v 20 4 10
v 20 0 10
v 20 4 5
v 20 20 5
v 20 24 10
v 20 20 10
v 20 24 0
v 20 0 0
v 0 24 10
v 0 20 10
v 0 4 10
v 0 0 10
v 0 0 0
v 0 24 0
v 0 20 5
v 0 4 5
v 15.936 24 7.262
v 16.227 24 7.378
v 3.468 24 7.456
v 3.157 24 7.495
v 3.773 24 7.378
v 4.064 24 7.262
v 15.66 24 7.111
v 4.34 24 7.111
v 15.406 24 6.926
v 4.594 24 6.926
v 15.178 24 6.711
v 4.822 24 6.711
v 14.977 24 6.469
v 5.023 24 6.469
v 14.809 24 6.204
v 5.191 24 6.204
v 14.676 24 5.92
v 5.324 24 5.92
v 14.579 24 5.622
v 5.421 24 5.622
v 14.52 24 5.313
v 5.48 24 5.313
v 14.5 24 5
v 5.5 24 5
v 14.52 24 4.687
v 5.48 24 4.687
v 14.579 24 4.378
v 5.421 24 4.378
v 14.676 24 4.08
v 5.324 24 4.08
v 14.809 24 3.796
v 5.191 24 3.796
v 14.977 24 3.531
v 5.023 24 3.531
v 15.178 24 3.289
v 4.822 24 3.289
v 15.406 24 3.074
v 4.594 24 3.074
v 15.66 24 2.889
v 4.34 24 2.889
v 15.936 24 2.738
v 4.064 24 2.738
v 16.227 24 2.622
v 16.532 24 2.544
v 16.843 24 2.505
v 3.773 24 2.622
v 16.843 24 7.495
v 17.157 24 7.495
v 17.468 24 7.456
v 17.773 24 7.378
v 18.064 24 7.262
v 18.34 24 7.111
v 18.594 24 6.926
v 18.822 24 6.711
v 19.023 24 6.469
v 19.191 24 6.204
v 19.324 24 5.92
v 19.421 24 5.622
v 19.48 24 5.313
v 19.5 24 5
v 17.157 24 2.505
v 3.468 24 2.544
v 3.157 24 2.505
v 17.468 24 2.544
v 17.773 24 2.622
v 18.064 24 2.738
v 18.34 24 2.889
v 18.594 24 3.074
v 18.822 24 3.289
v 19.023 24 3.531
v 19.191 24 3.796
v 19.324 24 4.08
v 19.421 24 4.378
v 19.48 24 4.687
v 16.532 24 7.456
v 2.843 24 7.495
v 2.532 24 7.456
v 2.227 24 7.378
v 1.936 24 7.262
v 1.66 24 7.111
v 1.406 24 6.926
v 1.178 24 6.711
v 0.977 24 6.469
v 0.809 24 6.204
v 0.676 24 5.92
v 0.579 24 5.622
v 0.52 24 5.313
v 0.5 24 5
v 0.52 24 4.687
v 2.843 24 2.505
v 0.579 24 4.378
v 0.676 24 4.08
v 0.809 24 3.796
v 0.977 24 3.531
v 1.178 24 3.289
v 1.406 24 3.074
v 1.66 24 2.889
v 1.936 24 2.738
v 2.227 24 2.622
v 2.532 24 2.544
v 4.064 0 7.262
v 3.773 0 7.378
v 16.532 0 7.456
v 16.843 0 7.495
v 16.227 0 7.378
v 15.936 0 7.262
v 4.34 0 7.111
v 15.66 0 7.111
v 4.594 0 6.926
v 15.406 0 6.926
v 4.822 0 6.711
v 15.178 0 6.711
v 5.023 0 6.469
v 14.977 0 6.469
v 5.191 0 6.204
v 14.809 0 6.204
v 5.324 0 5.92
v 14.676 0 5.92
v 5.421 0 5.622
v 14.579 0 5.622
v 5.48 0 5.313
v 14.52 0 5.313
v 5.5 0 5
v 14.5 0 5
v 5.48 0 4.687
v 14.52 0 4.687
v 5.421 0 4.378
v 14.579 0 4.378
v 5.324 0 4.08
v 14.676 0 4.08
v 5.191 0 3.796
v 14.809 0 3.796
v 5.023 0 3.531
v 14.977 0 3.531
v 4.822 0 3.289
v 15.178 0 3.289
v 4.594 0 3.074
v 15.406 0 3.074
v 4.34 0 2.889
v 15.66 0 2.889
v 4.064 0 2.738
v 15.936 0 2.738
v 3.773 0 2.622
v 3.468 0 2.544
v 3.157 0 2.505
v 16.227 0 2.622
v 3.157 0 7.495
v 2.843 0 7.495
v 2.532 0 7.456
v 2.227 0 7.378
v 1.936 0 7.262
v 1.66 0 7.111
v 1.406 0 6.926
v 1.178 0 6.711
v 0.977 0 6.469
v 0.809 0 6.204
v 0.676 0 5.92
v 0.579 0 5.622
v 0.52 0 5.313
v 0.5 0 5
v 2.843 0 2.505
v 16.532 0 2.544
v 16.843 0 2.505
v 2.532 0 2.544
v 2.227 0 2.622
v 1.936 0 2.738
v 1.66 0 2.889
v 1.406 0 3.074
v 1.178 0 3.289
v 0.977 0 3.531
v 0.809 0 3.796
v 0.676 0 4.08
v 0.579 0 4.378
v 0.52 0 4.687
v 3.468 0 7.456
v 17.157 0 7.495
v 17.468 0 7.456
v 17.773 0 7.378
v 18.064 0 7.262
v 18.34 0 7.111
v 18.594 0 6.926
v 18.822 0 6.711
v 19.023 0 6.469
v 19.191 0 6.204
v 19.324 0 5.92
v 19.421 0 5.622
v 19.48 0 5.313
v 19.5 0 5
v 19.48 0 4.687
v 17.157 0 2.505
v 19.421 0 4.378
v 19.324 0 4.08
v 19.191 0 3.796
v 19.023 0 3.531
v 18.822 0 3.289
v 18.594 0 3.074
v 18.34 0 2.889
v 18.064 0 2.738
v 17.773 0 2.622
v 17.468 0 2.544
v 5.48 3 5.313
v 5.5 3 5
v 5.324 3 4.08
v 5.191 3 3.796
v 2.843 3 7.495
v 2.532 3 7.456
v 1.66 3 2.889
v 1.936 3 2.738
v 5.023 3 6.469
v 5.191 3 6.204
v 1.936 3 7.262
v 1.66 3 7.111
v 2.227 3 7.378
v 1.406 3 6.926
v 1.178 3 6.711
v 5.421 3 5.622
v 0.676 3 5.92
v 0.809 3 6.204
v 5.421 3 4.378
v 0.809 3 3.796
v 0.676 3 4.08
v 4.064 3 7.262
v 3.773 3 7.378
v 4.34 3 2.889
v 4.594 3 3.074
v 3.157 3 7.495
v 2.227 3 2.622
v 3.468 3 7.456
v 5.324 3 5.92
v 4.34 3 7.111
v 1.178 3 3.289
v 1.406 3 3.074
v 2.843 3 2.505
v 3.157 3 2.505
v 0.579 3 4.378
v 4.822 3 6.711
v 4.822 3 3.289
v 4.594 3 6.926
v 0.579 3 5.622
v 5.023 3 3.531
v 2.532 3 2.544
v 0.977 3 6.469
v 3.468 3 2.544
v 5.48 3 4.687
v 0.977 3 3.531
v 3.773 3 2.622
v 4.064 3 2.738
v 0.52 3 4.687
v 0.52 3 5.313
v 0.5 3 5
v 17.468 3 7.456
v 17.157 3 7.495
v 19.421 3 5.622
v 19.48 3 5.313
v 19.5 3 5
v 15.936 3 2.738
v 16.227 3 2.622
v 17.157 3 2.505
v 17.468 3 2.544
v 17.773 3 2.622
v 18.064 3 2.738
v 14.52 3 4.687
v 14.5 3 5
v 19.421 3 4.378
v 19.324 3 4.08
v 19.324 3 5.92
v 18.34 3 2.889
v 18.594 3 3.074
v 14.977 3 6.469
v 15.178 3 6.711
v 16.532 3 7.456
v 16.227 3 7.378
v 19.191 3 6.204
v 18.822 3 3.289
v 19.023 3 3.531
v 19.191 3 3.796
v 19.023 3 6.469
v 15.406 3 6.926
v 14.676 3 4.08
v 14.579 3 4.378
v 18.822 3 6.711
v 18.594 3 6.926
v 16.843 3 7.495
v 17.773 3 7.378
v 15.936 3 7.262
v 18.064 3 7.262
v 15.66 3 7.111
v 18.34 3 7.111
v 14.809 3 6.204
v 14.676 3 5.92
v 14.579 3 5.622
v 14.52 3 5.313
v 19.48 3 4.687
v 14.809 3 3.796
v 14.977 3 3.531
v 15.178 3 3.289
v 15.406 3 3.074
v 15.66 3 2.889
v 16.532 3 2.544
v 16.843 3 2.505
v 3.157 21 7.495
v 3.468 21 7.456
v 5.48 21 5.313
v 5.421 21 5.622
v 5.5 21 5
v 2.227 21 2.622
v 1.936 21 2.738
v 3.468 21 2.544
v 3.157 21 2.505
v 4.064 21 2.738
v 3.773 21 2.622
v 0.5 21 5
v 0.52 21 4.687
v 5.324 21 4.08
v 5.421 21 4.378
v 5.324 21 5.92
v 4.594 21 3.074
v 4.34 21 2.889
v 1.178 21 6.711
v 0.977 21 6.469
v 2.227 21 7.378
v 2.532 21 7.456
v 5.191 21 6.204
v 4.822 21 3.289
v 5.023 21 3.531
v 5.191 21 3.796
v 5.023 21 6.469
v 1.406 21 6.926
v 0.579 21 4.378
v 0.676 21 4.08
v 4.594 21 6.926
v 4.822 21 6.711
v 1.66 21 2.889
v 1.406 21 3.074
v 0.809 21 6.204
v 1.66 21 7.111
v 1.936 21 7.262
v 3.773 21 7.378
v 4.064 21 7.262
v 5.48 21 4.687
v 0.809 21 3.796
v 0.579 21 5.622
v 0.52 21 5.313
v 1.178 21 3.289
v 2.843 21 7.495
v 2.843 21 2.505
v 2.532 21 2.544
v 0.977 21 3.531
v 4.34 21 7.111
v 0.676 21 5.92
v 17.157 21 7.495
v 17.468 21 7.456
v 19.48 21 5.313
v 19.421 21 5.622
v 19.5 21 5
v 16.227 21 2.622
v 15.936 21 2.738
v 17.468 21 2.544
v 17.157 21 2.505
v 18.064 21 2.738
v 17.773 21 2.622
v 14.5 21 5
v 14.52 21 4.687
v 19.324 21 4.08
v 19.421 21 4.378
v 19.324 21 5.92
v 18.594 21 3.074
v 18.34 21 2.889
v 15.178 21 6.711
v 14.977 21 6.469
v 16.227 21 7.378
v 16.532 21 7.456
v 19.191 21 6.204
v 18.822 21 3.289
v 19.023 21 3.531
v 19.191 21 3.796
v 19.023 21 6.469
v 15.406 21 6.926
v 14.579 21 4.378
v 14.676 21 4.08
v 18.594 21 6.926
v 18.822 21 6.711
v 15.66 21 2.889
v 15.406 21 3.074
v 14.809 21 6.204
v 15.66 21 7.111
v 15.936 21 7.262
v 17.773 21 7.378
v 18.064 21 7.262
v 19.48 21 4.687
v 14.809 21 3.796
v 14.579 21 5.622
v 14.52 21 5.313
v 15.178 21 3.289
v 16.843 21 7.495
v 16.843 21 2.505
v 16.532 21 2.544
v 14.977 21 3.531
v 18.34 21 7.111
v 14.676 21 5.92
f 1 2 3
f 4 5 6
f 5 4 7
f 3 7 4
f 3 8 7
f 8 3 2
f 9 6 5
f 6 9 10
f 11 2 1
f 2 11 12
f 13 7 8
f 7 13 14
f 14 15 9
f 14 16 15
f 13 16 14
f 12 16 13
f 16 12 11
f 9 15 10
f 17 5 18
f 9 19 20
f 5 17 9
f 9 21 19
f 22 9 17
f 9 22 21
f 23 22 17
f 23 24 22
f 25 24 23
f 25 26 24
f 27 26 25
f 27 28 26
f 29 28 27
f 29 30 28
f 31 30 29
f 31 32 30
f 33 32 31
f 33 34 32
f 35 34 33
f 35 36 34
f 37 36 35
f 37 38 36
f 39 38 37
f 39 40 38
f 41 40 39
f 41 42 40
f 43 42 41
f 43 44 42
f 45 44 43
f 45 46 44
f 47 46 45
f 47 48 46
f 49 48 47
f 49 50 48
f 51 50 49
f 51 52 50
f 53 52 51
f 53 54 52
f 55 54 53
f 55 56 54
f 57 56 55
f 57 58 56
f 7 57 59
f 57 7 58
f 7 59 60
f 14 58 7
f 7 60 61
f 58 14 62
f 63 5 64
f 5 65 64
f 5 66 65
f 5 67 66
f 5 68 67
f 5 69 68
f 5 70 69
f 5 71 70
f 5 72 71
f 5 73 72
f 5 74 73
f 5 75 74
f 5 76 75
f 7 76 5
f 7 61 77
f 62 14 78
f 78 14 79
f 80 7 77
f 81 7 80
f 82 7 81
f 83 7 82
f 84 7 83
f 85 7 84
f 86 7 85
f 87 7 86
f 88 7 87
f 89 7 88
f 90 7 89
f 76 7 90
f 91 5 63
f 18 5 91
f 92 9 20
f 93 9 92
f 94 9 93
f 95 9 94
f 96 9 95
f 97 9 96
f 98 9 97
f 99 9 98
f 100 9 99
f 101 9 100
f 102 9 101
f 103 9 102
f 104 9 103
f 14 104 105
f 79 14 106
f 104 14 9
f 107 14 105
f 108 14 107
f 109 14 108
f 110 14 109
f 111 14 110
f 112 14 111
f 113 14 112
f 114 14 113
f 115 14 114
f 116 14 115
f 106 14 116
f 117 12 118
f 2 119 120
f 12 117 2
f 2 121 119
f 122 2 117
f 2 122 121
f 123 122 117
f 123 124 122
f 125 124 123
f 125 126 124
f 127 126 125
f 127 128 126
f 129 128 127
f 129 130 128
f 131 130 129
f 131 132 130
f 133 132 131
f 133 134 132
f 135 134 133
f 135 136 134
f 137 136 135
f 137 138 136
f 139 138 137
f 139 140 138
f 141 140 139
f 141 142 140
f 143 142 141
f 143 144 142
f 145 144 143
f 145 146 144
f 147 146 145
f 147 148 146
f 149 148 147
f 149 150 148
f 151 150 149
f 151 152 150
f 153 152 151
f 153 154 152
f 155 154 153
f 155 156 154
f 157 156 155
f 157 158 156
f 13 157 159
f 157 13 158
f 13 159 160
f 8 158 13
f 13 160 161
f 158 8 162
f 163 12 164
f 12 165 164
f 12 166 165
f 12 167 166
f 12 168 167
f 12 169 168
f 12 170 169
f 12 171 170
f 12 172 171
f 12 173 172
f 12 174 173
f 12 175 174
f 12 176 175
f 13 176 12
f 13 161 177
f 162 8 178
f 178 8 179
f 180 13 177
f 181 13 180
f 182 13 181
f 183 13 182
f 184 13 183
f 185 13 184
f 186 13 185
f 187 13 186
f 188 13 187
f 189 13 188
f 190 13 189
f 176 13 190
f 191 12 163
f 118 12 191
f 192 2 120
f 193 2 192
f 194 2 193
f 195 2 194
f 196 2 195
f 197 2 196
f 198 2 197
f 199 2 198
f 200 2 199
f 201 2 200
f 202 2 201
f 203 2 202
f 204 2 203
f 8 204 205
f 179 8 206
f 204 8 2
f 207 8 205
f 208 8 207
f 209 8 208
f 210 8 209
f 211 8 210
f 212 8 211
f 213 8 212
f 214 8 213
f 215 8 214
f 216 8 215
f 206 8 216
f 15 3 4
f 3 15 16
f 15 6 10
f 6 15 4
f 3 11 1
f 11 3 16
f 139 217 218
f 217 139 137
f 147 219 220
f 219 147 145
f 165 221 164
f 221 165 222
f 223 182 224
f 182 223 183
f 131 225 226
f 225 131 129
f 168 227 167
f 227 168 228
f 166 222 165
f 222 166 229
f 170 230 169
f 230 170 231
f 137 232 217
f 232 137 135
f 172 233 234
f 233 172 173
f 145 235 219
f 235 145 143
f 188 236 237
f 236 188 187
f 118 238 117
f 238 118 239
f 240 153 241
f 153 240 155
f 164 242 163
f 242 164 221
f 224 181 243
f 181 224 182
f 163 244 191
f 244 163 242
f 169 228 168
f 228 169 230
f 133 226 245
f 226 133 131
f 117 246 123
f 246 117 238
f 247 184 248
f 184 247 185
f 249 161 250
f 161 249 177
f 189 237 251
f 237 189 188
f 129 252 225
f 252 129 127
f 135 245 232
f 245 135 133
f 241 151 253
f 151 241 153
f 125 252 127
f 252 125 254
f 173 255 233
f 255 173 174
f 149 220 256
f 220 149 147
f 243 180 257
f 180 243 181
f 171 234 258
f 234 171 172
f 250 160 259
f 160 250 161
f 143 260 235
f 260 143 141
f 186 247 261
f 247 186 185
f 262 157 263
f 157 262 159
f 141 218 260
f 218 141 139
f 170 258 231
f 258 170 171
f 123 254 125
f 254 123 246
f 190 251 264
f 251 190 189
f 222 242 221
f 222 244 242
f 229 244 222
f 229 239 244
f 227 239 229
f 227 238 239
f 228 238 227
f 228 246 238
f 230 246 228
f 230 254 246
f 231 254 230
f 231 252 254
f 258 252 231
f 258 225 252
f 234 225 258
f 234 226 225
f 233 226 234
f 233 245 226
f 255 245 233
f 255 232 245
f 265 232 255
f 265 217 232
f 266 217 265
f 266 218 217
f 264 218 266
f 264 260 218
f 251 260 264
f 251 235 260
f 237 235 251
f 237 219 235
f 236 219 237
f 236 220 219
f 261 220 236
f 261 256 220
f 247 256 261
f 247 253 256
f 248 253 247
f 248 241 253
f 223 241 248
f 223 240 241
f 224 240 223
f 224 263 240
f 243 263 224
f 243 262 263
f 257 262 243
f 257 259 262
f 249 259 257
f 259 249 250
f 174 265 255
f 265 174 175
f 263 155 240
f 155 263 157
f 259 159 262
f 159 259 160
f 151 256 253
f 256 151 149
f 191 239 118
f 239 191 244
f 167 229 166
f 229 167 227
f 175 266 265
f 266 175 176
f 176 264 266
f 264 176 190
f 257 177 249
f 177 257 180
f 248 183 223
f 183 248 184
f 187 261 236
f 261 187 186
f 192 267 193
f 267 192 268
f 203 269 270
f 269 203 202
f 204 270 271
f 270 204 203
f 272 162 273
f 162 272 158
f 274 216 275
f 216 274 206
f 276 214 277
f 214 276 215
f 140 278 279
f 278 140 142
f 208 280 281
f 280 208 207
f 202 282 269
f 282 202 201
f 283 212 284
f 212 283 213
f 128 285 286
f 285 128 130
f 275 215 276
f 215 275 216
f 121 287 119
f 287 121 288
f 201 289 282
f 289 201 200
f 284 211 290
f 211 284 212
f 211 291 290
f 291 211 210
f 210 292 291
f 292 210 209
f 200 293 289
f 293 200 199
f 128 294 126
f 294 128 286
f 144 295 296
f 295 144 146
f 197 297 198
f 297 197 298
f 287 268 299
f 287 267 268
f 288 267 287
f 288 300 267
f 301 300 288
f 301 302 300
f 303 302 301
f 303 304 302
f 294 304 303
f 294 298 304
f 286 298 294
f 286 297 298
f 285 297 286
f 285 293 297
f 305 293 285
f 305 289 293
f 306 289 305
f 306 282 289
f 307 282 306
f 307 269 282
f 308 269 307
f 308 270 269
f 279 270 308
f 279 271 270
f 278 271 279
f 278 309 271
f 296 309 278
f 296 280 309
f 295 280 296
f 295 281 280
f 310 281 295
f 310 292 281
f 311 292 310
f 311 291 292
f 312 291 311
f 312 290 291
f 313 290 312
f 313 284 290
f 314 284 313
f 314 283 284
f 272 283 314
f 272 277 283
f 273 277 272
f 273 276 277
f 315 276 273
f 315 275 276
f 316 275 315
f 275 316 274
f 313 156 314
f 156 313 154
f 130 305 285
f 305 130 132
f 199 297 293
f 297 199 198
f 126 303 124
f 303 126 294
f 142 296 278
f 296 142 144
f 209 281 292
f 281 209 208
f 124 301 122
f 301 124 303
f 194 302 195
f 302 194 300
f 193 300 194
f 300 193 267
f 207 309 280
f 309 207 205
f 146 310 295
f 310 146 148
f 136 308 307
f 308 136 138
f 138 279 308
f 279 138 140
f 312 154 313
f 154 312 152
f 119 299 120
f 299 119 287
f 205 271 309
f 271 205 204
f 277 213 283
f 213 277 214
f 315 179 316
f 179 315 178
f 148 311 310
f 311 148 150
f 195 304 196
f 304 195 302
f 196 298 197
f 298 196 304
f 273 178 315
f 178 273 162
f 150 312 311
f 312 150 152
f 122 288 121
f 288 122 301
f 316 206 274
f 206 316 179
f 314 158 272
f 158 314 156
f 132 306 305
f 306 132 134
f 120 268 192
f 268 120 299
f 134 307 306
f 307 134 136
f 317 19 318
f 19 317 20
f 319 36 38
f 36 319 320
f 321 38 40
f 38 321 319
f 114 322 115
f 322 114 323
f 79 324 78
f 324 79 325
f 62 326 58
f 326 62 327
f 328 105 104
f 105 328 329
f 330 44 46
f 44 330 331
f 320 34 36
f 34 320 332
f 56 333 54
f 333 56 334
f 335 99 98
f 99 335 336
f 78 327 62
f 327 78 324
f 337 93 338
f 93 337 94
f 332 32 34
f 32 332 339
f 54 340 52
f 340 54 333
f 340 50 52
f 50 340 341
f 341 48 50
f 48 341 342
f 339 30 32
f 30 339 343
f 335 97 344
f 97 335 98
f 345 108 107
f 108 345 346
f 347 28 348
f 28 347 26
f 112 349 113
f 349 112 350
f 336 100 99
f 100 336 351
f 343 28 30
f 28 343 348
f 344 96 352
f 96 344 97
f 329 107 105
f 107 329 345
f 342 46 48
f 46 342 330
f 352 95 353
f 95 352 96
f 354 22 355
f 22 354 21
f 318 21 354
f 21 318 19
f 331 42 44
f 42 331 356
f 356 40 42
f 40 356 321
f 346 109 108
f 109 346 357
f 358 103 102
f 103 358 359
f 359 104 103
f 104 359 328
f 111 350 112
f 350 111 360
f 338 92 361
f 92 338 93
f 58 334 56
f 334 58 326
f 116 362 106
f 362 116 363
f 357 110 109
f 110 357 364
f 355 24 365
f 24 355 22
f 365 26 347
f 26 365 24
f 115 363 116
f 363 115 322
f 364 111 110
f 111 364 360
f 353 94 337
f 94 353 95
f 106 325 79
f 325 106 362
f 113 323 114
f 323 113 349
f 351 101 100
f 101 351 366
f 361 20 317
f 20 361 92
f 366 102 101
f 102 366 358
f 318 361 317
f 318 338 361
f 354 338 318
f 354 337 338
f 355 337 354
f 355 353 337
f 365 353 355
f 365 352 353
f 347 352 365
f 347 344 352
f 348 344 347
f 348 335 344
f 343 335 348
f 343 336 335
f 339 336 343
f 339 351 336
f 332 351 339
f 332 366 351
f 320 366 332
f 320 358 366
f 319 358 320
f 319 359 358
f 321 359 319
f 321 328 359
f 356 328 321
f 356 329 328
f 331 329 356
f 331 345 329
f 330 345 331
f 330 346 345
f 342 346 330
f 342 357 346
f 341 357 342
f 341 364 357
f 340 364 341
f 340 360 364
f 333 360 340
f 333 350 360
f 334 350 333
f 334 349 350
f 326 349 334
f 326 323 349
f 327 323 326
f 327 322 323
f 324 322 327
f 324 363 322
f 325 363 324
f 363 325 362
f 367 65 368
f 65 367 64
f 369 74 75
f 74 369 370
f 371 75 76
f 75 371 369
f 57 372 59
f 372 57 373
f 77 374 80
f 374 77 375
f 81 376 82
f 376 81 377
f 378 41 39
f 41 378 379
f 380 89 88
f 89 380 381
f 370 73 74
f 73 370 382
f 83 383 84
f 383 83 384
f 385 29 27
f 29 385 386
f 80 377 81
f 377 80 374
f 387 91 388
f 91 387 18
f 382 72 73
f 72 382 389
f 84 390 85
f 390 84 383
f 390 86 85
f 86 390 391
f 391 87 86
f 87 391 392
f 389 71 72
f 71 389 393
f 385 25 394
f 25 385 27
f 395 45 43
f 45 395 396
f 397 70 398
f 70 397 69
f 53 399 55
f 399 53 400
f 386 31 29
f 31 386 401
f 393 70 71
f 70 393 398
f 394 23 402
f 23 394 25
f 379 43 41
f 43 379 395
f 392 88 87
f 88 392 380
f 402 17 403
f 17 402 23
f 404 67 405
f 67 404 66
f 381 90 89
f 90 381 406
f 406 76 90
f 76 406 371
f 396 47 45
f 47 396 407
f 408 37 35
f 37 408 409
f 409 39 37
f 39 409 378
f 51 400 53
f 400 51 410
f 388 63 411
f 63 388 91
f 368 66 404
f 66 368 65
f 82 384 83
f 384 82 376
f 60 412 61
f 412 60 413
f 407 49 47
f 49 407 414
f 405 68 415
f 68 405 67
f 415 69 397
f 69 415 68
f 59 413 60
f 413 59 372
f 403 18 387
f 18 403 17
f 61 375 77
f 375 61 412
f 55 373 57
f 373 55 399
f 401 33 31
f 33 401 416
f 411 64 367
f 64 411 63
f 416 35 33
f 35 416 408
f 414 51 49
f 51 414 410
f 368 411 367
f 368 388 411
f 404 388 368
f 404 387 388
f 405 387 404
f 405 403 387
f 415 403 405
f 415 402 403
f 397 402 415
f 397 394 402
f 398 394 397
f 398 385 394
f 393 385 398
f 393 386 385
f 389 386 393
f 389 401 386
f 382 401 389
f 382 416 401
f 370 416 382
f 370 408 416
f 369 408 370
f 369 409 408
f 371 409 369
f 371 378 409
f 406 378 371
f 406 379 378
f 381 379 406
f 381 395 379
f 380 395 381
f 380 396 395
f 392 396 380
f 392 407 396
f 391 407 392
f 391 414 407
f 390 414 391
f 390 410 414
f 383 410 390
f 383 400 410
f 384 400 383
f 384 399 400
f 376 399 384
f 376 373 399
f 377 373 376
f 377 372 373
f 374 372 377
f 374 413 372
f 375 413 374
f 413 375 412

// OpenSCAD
// Copyright 2024 Martin Scheidt (Attribution 4.0 International, CC-BY 4.0)
//
// You are free to copy and redistribute the material in any medium or format.
// You are free to remix, transform, and build upon the material for any purpose, even commercially.
// You must give appropriate credit, provide a link to the license, and indicate if changes were made.
// You may not apply legal terms or technological measures that legally restrict others from doing anything the license permits.
// No warranties are given.
    
$fn = 50;// number of fragments
width = 24;
height = 10;
length = 20;
rim_width = 4;// must be thicker than magnet_thickness
magnet_distance = 20;
magnet_width = 5;
magnet_thickness  = 3.0;
magnet_sqeeze_tolerance = 0;
magnet_outer_distance = 0.5;
//lever_height = 10;
//lever_thickness = 4;

// core body
difference(){
    cube([length ,width, height]);
    translate([-length*0.05,rim_width,height/2]) cube([length*1.1,width-rim_width*2, height/2*1.1]);
    translate([magnet_width/2+magnet_outer_distance,magnet_thickness,magnet_width]) rotate([90,0,0]) cylinder(d = magnet_width - magnet_sqeeze_tolerance, h = magnet_thickness +1);//magnet 1
    translate([length-magnet_width/2-magnet_outer_distance,magnet_thickness,magnet_width]) rotate([90,0,0]) cylinder(d = magnet_width - magnet_sqeeze_tolerance, h = magnet_thickness +1);//magnet 2
    translate([magnet_width/2+magnet_outer_distance,width+1,magnet_width]) rotate([90,0,0]) cylinder(d = magnet_width - magnet_sqeeze_tolerance, h = magnet_thickness+1);//magnet 3
    translate([length-magnet_width/2-magnet_outer_distance,width+1,magnet_width]) rotate([90,0,0]) cylinder(d = magnet_width - magnet_sqeeze_tolerance, h = magnet_thickness+1);//magnet 4
};


// lever
